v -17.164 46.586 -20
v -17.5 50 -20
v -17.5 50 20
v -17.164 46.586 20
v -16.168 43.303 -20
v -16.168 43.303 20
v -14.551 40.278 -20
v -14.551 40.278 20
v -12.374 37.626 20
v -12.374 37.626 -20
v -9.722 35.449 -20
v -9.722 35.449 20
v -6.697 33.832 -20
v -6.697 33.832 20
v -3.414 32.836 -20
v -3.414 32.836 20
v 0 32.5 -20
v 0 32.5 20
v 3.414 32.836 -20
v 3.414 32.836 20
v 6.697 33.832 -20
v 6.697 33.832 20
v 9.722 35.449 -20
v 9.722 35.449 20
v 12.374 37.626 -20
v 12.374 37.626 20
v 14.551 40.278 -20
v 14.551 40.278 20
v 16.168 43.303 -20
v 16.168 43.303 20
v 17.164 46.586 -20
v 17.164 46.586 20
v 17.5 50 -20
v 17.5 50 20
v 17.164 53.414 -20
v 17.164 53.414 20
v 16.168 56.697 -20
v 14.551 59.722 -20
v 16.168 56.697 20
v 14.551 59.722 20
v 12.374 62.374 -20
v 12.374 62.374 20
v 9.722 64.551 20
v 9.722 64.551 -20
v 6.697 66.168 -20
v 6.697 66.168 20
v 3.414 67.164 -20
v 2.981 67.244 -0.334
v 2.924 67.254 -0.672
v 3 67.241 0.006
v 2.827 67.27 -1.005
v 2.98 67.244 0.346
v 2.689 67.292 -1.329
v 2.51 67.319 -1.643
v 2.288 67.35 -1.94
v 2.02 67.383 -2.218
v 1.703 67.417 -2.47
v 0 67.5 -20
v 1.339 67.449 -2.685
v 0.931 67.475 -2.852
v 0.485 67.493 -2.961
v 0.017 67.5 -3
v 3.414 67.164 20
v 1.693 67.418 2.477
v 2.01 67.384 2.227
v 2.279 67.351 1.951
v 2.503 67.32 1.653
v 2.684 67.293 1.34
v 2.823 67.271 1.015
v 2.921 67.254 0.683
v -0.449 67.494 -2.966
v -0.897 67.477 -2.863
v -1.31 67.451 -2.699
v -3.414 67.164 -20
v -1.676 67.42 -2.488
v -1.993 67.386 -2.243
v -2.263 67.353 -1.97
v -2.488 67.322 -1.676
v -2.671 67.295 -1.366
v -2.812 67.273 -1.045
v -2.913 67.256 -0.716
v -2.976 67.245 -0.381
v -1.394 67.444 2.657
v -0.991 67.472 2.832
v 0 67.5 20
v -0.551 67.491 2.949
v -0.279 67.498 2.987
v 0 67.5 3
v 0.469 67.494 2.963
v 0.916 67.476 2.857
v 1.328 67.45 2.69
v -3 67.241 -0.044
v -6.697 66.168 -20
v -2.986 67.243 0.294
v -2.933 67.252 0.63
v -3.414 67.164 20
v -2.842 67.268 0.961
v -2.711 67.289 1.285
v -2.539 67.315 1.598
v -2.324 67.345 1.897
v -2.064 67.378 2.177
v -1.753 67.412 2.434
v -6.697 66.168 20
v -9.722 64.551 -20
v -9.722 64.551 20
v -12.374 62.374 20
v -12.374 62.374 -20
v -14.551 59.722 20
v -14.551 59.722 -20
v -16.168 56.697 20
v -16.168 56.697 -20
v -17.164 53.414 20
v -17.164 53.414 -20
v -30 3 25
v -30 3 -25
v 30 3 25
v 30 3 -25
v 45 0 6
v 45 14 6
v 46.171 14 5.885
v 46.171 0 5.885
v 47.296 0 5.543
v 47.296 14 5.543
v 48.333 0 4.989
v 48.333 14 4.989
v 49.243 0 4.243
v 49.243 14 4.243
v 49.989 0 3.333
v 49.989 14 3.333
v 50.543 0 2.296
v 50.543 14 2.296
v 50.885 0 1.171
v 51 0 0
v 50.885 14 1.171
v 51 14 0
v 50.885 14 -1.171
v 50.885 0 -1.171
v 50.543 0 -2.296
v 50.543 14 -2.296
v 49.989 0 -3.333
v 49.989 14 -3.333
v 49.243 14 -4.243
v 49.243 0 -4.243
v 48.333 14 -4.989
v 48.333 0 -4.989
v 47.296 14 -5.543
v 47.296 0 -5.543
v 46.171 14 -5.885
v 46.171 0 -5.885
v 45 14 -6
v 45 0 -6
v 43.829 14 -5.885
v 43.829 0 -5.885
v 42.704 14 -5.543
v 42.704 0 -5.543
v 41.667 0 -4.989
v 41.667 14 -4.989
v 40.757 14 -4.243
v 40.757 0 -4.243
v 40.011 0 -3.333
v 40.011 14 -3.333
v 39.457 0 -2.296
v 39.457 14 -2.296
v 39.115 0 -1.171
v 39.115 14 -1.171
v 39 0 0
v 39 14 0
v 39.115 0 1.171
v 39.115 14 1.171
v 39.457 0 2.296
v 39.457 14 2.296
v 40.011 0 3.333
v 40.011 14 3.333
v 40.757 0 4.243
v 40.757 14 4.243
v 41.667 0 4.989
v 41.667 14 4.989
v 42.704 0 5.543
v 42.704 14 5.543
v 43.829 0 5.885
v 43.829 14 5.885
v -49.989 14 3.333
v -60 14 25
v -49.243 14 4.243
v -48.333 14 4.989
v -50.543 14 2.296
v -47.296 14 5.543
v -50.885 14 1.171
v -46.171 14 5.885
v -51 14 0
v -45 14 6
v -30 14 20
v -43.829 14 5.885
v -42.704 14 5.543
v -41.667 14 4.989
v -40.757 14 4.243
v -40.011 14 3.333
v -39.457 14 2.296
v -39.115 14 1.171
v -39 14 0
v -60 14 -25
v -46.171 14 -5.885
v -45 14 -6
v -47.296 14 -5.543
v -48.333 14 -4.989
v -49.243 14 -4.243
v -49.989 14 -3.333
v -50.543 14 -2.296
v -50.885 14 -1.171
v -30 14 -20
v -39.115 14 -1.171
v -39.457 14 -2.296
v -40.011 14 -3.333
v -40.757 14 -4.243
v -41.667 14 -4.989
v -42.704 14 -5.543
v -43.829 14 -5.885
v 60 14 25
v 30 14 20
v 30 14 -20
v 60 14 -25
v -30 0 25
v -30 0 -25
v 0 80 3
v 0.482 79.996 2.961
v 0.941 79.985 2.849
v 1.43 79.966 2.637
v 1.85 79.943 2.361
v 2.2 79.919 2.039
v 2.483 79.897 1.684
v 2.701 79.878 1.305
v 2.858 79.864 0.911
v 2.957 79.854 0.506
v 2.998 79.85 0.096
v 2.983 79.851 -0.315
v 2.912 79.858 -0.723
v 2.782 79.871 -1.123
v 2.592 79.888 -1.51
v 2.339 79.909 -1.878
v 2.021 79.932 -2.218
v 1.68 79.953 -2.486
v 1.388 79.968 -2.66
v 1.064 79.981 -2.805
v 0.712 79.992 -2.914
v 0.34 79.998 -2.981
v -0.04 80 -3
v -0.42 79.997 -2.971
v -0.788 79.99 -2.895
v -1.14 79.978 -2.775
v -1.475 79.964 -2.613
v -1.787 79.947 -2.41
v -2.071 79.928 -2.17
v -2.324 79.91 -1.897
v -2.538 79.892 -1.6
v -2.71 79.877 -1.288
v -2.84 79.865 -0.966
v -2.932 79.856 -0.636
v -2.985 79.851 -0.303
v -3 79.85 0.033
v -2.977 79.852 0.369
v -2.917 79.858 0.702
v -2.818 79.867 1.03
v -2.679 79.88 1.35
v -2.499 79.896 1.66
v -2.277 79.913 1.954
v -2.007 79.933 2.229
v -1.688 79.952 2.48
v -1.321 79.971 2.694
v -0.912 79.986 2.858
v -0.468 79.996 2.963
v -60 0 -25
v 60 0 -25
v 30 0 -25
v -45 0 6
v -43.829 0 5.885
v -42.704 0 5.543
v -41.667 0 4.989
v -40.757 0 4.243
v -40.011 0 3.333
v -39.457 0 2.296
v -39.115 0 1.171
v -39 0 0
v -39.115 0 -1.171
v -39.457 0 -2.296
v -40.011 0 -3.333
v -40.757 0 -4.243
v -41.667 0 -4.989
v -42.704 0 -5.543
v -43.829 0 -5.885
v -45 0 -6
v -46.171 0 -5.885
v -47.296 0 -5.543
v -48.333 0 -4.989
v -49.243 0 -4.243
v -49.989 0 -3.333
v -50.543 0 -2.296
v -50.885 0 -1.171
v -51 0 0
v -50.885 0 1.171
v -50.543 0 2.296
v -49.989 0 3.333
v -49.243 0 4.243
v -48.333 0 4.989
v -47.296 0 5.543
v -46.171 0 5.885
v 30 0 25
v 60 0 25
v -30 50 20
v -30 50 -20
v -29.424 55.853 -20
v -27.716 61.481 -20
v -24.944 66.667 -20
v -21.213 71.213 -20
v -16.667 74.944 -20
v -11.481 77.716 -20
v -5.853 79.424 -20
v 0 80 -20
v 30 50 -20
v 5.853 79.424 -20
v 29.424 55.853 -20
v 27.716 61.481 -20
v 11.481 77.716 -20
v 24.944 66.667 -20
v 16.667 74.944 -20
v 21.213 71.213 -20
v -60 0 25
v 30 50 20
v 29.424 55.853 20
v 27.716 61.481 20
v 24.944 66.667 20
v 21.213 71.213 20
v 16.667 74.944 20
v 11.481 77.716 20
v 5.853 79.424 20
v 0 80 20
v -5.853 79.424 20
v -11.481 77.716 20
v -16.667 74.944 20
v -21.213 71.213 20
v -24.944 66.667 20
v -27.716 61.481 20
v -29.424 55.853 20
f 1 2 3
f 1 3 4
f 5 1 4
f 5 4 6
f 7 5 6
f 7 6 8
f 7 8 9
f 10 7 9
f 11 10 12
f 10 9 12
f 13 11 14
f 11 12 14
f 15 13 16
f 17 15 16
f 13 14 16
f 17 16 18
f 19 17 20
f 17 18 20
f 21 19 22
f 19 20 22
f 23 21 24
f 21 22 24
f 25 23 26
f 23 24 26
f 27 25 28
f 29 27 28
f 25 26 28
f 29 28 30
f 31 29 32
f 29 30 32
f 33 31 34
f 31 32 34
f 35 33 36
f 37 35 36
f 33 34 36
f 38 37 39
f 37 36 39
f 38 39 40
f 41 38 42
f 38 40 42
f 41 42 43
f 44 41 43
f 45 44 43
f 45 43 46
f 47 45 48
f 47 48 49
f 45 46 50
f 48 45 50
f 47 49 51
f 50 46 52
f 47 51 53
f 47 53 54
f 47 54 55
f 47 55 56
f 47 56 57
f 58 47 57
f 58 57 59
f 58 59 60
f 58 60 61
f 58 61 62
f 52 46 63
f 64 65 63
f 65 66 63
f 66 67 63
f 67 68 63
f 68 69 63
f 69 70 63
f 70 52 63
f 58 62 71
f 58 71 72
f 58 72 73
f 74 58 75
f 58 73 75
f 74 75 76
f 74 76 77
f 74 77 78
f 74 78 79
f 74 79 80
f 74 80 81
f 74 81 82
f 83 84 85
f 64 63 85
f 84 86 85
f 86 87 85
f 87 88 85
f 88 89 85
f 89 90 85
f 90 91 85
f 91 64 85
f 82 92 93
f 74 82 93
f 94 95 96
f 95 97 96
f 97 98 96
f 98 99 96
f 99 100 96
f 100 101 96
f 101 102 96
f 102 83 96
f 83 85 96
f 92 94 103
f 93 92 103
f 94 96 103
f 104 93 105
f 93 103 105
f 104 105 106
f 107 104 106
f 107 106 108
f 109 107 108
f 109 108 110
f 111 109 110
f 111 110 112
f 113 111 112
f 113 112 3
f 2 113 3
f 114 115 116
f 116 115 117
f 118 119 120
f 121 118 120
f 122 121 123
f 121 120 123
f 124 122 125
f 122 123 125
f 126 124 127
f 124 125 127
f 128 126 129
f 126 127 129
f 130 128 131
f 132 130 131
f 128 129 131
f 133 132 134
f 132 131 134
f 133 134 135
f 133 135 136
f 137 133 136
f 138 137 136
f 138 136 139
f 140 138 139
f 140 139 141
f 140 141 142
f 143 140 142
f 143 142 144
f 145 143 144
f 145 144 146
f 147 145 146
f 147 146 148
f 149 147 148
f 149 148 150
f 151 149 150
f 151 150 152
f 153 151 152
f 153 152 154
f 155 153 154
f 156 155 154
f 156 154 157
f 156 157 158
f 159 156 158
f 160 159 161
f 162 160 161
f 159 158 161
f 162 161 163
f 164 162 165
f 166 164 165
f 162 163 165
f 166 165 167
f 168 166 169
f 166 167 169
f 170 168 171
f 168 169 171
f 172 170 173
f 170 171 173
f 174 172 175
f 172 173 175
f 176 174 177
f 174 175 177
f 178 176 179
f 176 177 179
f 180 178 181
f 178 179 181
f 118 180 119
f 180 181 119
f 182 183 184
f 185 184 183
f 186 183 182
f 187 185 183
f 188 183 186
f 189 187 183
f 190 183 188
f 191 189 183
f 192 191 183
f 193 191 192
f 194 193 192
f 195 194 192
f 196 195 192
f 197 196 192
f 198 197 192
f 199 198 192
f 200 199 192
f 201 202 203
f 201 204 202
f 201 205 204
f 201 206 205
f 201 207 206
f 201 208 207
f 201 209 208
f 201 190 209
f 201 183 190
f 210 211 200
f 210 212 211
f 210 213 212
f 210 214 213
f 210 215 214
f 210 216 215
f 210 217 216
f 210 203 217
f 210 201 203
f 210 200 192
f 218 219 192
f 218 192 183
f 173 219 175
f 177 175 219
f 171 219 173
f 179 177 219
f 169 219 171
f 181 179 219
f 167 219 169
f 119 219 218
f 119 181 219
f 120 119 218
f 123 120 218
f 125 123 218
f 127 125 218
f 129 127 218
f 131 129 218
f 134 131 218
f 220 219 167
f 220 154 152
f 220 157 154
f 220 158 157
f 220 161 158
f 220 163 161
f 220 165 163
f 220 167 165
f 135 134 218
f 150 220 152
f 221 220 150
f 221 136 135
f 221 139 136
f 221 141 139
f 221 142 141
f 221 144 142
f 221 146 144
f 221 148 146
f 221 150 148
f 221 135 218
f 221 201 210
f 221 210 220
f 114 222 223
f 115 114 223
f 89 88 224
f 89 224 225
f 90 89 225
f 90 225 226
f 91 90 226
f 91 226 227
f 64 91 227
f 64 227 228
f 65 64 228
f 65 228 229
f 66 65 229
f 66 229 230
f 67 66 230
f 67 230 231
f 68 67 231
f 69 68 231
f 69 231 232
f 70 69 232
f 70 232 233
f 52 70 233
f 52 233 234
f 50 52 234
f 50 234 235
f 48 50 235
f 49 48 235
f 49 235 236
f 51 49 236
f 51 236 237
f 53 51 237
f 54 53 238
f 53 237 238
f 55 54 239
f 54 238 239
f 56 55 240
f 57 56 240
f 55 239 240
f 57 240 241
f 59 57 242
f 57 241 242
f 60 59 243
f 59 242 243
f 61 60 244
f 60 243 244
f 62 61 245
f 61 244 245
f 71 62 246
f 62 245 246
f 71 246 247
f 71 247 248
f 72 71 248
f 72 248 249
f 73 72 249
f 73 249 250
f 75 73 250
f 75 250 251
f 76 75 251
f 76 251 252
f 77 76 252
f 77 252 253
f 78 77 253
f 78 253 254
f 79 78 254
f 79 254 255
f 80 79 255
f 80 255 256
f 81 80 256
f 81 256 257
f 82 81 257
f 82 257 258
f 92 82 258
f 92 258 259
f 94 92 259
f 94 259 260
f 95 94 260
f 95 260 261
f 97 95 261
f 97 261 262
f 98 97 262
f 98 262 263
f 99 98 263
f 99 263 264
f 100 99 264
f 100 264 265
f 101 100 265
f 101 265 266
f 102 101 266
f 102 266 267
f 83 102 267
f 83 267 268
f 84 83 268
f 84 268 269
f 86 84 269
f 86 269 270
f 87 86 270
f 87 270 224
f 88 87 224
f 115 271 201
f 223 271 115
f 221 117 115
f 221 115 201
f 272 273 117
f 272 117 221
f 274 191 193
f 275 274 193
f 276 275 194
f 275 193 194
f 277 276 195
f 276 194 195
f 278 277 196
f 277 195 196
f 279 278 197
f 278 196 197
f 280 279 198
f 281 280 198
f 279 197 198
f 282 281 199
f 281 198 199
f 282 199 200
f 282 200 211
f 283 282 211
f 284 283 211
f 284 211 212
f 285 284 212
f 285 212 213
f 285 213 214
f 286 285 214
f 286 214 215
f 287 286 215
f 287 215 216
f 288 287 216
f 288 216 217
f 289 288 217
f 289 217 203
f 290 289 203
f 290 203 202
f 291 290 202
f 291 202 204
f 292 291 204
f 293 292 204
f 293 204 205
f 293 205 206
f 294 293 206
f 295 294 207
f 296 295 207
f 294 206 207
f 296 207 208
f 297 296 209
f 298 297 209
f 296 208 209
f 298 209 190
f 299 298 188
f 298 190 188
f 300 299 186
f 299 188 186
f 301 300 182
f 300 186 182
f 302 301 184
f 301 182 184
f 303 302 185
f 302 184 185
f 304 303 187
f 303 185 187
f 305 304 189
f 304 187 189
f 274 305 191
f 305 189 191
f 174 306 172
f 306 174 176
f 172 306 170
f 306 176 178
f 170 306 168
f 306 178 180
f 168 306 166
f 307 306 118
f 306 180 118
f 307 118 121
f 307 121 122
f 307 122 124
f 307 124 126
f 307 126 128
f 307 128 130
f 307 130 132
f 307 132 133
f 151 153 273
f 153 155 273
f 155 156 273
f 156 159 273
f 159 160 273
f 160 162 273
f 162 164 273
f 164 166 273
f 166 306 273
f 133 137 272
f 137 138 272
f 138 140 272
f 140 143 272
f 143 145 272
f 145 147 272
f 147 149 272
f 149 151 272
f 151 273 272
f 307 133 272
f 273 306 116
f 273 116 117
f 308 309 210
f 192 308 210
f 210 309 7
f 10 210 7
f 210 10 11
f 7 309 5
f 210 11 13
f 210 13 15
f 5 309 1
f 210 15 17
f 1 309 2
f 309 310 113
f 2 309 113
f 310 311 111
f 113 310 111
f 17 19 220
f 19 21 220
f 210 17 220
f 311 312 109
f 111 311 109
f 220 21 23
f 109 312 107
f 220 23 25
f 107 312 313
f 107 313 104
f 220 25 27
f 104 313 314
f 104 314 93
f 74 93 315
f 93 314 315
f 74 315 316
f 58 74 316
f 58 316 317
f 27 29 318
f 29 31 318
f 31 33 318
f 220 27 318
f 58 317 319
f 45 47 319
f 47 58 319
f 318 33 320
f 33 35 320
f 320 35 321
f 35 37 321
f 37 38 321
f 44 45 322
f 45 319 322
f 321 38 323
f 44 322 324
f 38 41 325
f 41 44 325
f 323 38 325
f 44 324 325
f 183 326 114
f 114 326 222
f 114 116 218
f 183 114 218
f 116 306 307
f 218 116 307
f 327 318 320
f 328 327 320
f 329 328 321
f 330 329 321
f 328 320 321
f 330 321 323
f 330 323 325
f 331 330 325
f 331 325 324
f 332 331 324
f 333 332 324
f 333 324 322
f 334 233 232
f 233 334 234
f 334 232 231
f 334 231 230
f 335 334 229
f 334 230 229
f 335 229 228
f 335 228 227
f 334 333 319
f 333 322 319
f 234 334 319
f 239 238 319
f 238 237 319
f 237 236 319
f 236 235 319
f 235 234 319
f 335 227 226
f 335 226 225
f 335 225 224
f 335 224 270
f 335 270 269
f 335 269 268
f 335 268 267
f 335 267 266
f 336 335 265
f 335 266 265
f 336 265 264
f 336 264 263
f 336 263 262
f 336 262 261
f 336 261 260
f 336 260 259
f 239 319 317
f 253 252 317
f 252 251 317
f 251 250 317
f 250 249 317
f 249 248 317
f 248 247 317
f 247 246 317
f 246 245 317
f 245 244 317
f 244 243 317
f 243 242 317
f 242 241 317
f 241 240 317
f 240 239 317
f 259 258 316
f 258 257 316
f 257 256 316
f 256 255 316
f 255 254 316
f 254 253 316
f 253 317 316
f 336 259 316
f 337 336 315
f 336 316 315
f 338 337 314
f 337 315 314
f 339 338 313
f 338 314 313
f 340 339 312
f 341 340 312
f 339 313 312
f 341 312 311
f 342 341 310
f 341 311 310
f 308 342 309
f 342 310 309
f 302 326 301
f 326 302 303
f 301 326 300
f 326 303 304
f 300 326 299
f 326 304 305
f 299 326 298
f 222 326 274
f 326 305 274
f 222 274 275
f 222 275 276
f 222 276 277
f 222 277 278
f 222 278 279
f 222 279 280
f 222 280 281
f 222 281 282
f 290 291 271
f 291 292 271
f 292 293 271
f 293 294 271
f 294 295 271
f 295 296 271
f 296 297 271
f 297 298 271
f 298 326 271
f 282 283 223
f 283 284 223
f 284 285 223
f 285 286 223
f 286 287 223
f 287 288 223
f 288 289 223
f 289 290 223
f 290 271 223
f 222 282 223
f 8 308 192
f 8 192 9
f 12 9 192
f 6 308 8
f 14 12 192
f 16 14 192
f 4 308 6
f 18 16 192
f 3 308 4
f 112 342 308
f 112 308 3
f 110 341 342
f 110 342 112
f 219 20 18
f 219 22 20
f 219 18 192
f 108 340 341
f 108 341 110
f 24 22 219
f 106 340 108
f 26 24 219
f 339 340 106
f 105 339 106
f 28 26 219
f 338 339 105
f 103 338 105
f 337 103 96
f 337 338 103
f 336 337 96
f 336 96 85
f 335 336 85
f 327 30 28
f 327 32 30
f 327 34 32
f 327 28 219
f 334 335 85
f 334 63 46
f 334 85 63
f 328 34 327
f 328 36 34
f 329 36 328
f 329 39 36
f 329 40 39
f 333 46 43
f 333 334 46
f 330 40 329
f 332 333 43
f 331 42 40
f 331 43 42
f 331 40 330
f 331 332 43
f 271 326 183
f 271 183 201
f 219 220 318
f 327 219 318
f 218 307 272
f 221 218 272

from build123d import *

# Parameters (mm, degrees)
SKETCH_1_W          = 120
SKETCH_1_H          = 50
EXTRUDE_1_DEPTH     = 14
EXTRUDE_START       = -20
EXTRUDE_3_DEPTH     = 40
SKETCH_4_R          = 17.5
CUT_EXTRUDE_1_DEPTH = 112.803398875
SKETCH_5_W          = 60
SKETCH_5_H          = 50
CUT_EXTRUDE_2_DEPTH = 3
SKETCH_6_R          = 6
CUT_EXTRUDE_3_DEPTH = 93.633687177
SKETCH_7_R          = 3
CUT_EXTRUDE_4_DEPTH = 13


# Read off the part's stored shape, not the designer's step: 凸台-拉伸3
with BuildPart() as part:
    # 草图1 → 凸台-拉伸1 (new body)
    with BuildSketch(Plane(origin=(0, 0, 0), x_dir=(1, 0, 0), z_dir=(0, 1, 0))):
        Rectangle(SKETCH_1_W, SKETCH_1_H)
    extrude(amount=EXTRUDE_1_DEPTH)

    # 凸台-拉伸3 outline → 凸台-拉伸3 (add)
    with BuildSketch(Plane.XY.offset(EXTRUDE_START)):
        with BuildLine():
            Line((30, 14), (30, 50))
            ThreePointArc((30, 50), (0, 80), (-30, 50))
            Line((-30, 50), (-30, 14))
            Line((-30, 14), (30, 14))
        make_face()
    extrude(amount=EXTRUDE_3_DEPTH)

    # 草图4 → 切除-拉伸1 (cut, through all)
    with BuildSketch(Plane.XY.offset(25)):
        with Locations(Location((0, 50, 0), (0, 0, 180))):
            Circle(SKETCH_4_R)
    extrude(amount=-CUT_EXTRUDE_1_DEPTH, mode=Mode.SUBTRACT)

    # 草图5 → 切除-拉伸2 (cut)
    with BuildSketch(Plane(origin=(0, 0, 0), x_dir=(1, 0, 0), z_dir=(0, 1, 0))):
        Rectangle(SKETCH_5_W, SKETCH_5_H)
    extrude(amount=CUT_EXTRUDE_2_DEPTH, mode=Mode.SUBTRACT)

    # 草图6 → 切除-拉伸3 (cut, through all)
    with BuildSketch(Plane(origin=(0, 14, 0), x_dir=(1, 0, 0), z_dir=(0, 1, 0))):
        with Locations(Location((-45, 0, 0), (0, 0, 270))):
            Circle(SKETCH_6_R)
        with Locations(Location((45, 0, 0), (0, 0, 270))):
            Circle(SKETCH_6_R)
    extrude(amount=-CUT_EXTRUDE_3_DEPTH, mode=Mode.SUBTRACT)

    # 草图7 → 切除-拉伸4 (cut)
    with BuildSketch(Plane(origin=(0, 80, 0), x_dir=(1, 0, 0), z_dir=(0, 1, 0))):
        with Locations(Location((0, 0, 0), (0, 0, 270))):
            Circle(SKETCH_7_R)
    extrude(amount=-CUT_EXTRUDE_4_DEPTH, mode=Mode.SUBTRACT)


solid = part.part
